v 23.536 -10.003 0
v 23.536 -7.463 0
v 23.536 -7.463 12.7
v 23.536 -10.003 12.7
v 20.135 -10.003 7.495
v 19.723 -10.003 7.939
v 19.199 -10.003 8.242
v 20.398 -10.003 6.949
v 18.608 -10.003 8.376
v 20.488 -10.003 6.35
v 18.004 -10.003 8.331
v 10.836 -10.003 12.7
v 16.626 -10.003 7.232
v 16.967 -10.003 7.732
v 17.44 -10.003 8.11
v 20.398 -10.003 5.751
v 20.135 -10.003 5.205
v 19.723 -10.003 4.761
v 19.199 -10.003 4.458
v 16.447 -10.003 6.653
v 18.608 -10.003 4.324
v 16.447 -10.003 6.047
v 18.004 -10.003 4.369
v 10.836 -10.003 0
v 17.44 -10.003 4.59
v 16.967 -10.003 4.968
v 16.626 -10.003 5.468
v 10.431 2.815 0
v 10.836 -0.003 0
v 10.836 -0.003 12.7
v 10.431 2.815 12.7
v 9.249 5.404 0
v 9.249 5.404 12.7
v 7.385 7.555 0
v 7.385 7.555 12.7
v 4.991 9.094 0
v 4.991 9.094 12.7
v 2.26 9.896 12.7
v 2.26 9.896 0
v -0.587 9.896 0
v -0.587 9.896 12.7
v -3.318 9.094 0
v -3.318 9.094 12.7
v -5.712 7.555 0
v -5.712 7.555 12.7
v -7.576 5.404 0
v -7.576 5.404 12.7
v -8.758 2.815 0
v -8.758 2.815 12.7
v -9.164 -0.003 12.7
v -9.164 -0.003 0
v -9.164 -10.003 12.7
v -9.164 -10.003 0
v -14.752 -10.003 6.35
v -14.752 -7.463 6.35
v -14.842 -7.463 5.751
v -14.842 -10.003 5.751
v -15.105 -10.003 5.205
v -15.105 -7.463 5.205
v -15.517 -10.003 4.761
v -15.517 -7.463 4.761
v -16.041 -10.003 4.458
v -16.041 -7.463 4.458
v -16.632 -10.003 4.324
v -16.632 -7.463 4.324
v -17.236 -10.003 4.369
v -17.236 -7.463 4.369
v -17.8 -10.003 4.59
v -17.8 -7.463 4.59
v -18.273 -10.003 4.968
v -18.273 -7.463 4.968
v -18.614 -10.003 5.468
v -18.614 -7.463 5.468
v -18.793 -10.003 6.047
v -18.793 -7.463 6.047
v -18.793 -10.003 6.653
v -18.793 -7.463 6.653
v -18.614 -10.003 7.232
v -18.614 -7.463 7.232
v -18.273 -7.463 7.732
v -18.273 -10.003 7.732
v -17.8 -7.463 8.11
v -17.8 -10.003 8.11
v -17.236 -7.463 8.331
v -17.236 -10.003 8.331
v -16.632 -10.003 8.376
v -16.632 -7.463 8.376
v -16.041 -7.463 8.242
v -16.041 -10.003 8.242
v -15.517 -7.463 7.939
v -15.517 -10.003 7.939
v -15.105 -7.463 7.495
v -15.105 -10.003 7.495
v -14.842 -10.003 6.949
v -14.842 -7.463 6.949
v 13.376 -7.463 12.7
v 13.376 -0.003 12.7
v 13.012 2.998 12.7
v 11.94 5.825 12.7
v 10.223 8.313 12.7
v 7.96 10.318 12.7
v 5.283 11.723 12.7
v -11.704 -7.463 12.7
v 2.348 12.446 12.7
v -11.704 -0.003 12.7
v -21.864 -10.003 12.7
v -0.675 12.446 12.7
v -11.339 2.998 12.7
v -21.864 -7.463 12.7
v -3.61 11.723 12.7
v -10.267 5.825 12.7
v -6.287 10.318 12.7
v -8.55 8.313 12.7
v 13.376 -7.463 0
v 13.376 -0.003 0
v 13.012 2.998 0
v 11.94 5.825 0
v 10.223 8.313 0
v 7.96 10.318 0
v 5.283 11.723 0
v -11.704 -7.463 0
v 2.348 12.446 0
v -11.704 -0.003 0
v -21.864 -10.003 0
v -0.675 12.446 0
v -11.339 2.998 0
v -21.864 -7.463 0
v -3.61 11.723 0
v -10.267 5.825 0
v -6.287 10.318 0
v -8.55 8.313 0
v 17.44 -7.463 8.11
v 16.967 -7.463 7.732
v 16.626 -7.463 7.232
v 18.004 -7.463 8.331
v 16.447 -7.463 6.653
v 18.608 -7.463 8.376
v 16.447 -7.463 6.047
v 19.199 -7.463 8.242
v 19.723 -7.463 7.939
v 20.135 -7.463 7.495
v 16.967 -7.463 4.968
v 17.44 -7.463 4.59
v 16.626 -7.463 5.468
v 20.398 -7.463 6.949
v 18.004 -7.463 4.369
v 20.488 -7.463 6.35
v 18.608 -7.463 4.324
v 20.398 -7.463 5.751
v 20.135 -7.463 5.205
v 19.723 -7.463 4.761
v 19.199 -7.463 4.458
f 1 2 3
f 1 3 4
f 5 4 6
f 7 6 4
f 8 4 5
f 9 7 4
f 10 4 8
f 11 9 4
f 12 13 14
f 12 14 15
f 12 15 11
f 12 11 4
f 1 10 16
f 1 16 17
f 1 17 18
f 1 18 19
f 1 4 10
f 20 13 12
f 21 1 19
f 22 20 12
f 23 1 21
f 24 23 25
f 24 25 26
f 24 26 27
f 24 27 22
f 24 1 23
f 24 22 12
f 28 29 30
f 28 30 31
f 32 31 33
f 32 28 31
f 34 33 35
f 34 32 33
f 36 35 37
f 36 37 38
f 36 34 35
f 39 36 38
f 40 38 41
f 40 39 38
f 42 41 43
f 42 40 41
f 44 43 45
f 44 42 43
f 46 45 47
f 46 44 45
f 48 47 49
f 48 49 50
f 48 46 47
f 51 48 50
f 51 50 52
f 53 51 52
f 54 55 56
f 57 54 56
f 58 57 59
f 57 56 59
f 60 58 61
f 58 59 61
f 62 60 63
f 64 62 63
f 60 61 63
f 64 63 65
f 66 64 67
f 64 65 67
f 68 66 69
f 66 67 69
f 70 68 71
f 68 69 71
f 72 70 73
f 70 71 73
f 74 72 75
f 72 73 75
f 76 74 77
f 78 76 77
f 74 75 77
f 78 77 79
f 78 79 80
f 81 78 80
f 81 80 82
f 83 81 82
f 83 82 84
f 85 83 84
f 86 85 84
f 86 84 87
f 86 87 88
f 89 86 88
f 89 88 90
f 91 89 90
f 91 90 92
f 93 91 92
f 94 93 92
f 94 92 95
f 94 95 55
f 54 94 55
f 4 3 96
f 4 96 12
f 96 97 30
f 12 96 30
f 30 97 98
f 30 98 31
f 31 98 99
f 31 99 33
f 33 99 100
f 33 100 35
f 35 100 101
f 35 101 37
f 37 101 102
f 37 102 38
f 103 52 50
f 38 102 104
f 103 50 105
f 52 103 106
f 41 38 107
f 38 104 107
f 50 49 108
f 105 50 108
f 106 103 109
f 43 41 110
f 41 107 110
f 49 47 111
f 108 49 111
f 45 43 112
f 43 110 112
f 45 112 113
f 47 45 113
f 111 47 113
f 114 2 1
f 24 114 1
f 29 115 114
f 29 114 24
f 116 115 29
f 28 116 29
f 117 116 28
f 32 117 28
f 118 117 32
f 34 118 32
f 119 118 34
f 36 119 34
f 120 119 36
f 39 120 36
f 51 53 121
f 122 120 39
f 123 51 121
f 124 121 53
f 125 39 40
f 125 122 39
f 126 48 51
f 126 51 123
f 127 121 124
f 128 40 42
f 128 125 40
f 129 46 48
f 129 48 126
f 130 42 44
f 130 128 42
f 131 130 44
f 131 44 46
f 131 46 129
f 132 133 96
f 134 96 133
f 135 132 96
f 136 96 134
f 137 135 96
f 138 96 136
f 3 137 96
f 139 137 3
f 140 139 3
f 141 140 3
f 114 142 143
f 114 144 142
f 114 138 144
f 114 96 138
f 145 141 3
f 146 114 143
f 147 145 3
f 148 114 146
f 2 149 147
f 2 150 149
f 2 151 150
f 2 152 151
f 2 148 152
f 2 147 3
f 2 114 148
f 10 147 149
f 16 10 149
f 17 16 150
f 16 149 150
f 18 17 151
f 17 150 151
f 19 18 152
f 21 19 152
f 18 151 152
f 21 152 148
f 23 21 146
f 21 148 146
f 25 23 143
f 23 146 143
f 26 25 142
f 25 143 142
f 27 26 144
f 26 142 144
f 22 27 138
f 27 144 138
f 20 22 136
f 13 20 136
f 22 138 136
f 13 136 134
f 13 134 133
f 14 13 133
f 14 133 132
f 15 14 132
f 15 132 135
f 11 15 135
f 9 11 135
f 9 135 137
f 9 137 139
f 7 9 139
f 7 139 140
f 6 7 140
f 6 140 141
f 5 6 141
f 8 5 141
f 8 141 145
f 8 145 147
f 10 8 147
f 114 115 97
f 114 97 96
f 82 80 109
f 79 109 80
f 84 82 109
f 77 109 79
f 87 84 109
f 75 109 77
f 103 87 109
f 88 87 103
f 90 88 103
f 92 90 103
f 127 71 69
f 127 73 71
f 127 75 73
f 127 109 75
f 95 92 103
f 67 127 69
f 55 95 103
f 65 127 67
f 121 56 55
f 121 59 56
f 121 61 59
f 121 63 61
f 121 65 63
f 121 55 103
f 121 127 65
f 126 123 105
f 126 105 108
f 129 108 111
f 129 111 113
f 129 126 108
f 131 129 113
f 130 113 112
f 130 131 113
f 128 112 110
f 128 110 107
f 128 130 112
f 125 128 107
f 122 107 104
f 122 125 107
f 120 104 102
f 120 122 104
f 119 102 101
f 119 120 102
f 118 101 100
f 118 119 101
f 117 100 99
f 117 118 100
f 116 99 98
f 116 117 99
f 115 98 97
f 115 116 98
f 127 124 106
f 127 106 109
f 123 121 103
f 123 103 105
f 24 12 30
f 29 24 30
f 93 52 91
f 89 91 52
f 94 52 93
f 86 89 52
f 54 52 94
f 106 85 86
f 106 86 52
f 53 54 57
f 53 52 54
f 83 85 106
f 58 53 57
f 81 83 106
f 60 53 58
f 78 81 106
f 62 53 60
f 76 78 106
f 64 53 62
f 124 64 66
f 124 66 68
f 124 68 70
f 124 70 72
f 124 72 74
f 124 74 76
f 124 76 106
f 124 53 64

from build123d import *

# Parameters (mm, degrees)
BOSS_EXTRUDE1_DEPTH = 12.7
SKETCH3_R           = 2.032
CUT_EXTRUDE1_DEPTH  = 12.7


with BuildPart() as part:
    # Sketch1 → Boss-Extrude1 (new body)
    with BuildSketch(Plane.XY):
        with BuildLine():
            Line((-9.163521891, -0.002572295), (-9.163521891, -10.002577695))
            Line((-9.163521891, -10.002577695), (-21.863521891, -10.002577695))
            Line((-21.863521891, -10.002577695), (-21.863521891, -7.462577695))
            Line((-21.863521891, -7.462577695), (-11.703521891, -7.462577695))
            Line((-11.703521891, -7.462577695), (-11.703521891, -0.002572295))
            ThreePointArc((-11.703521891, -0.002572295), (0.836483509, 12.537433105), (13.376488909, -0.002572295))
            Line((13.376488909, -0.002572295), (13.376488909, -7.462577695))
            Line((13.376488909, -7.462577695), (23.536488909, -7.462577695))
            Line((23.536488909, -7.462577695), (23.536488909, -10.002577695))
            Line((23.536488909, -10.002577695), (10.836488909, -10.002577695))
            Line((10.836488909, -10.002577695), (10.836488909, -0.002572295))
            ThreePointArc((10.836488909, -0.002572295), (0.836483509, 9.997433105), (-9.163521891, -0.002572295))
        make_face()
    extrude(amount=BOSS_EXTRUDE1_DEPTH)

    # Sketch3 → Cut-Extrude1 (cut)
    with BuildSketch(Plane(origin=(0, -7.462577695, 0), x_dir=(1, 0, 0), z_dir=(0, 1, 0))):
        with Locations((-16.783521891, -6.35)):
            Circle(SKETCH3_R)
        with Locations((18.456488909, -6.35)):
            Circle(SKETCH3_R)
    extrude(amount=-CUT_EXTRUDE1_DEPTH, mode=Mode.SUBTRACT)


solid = part.part
